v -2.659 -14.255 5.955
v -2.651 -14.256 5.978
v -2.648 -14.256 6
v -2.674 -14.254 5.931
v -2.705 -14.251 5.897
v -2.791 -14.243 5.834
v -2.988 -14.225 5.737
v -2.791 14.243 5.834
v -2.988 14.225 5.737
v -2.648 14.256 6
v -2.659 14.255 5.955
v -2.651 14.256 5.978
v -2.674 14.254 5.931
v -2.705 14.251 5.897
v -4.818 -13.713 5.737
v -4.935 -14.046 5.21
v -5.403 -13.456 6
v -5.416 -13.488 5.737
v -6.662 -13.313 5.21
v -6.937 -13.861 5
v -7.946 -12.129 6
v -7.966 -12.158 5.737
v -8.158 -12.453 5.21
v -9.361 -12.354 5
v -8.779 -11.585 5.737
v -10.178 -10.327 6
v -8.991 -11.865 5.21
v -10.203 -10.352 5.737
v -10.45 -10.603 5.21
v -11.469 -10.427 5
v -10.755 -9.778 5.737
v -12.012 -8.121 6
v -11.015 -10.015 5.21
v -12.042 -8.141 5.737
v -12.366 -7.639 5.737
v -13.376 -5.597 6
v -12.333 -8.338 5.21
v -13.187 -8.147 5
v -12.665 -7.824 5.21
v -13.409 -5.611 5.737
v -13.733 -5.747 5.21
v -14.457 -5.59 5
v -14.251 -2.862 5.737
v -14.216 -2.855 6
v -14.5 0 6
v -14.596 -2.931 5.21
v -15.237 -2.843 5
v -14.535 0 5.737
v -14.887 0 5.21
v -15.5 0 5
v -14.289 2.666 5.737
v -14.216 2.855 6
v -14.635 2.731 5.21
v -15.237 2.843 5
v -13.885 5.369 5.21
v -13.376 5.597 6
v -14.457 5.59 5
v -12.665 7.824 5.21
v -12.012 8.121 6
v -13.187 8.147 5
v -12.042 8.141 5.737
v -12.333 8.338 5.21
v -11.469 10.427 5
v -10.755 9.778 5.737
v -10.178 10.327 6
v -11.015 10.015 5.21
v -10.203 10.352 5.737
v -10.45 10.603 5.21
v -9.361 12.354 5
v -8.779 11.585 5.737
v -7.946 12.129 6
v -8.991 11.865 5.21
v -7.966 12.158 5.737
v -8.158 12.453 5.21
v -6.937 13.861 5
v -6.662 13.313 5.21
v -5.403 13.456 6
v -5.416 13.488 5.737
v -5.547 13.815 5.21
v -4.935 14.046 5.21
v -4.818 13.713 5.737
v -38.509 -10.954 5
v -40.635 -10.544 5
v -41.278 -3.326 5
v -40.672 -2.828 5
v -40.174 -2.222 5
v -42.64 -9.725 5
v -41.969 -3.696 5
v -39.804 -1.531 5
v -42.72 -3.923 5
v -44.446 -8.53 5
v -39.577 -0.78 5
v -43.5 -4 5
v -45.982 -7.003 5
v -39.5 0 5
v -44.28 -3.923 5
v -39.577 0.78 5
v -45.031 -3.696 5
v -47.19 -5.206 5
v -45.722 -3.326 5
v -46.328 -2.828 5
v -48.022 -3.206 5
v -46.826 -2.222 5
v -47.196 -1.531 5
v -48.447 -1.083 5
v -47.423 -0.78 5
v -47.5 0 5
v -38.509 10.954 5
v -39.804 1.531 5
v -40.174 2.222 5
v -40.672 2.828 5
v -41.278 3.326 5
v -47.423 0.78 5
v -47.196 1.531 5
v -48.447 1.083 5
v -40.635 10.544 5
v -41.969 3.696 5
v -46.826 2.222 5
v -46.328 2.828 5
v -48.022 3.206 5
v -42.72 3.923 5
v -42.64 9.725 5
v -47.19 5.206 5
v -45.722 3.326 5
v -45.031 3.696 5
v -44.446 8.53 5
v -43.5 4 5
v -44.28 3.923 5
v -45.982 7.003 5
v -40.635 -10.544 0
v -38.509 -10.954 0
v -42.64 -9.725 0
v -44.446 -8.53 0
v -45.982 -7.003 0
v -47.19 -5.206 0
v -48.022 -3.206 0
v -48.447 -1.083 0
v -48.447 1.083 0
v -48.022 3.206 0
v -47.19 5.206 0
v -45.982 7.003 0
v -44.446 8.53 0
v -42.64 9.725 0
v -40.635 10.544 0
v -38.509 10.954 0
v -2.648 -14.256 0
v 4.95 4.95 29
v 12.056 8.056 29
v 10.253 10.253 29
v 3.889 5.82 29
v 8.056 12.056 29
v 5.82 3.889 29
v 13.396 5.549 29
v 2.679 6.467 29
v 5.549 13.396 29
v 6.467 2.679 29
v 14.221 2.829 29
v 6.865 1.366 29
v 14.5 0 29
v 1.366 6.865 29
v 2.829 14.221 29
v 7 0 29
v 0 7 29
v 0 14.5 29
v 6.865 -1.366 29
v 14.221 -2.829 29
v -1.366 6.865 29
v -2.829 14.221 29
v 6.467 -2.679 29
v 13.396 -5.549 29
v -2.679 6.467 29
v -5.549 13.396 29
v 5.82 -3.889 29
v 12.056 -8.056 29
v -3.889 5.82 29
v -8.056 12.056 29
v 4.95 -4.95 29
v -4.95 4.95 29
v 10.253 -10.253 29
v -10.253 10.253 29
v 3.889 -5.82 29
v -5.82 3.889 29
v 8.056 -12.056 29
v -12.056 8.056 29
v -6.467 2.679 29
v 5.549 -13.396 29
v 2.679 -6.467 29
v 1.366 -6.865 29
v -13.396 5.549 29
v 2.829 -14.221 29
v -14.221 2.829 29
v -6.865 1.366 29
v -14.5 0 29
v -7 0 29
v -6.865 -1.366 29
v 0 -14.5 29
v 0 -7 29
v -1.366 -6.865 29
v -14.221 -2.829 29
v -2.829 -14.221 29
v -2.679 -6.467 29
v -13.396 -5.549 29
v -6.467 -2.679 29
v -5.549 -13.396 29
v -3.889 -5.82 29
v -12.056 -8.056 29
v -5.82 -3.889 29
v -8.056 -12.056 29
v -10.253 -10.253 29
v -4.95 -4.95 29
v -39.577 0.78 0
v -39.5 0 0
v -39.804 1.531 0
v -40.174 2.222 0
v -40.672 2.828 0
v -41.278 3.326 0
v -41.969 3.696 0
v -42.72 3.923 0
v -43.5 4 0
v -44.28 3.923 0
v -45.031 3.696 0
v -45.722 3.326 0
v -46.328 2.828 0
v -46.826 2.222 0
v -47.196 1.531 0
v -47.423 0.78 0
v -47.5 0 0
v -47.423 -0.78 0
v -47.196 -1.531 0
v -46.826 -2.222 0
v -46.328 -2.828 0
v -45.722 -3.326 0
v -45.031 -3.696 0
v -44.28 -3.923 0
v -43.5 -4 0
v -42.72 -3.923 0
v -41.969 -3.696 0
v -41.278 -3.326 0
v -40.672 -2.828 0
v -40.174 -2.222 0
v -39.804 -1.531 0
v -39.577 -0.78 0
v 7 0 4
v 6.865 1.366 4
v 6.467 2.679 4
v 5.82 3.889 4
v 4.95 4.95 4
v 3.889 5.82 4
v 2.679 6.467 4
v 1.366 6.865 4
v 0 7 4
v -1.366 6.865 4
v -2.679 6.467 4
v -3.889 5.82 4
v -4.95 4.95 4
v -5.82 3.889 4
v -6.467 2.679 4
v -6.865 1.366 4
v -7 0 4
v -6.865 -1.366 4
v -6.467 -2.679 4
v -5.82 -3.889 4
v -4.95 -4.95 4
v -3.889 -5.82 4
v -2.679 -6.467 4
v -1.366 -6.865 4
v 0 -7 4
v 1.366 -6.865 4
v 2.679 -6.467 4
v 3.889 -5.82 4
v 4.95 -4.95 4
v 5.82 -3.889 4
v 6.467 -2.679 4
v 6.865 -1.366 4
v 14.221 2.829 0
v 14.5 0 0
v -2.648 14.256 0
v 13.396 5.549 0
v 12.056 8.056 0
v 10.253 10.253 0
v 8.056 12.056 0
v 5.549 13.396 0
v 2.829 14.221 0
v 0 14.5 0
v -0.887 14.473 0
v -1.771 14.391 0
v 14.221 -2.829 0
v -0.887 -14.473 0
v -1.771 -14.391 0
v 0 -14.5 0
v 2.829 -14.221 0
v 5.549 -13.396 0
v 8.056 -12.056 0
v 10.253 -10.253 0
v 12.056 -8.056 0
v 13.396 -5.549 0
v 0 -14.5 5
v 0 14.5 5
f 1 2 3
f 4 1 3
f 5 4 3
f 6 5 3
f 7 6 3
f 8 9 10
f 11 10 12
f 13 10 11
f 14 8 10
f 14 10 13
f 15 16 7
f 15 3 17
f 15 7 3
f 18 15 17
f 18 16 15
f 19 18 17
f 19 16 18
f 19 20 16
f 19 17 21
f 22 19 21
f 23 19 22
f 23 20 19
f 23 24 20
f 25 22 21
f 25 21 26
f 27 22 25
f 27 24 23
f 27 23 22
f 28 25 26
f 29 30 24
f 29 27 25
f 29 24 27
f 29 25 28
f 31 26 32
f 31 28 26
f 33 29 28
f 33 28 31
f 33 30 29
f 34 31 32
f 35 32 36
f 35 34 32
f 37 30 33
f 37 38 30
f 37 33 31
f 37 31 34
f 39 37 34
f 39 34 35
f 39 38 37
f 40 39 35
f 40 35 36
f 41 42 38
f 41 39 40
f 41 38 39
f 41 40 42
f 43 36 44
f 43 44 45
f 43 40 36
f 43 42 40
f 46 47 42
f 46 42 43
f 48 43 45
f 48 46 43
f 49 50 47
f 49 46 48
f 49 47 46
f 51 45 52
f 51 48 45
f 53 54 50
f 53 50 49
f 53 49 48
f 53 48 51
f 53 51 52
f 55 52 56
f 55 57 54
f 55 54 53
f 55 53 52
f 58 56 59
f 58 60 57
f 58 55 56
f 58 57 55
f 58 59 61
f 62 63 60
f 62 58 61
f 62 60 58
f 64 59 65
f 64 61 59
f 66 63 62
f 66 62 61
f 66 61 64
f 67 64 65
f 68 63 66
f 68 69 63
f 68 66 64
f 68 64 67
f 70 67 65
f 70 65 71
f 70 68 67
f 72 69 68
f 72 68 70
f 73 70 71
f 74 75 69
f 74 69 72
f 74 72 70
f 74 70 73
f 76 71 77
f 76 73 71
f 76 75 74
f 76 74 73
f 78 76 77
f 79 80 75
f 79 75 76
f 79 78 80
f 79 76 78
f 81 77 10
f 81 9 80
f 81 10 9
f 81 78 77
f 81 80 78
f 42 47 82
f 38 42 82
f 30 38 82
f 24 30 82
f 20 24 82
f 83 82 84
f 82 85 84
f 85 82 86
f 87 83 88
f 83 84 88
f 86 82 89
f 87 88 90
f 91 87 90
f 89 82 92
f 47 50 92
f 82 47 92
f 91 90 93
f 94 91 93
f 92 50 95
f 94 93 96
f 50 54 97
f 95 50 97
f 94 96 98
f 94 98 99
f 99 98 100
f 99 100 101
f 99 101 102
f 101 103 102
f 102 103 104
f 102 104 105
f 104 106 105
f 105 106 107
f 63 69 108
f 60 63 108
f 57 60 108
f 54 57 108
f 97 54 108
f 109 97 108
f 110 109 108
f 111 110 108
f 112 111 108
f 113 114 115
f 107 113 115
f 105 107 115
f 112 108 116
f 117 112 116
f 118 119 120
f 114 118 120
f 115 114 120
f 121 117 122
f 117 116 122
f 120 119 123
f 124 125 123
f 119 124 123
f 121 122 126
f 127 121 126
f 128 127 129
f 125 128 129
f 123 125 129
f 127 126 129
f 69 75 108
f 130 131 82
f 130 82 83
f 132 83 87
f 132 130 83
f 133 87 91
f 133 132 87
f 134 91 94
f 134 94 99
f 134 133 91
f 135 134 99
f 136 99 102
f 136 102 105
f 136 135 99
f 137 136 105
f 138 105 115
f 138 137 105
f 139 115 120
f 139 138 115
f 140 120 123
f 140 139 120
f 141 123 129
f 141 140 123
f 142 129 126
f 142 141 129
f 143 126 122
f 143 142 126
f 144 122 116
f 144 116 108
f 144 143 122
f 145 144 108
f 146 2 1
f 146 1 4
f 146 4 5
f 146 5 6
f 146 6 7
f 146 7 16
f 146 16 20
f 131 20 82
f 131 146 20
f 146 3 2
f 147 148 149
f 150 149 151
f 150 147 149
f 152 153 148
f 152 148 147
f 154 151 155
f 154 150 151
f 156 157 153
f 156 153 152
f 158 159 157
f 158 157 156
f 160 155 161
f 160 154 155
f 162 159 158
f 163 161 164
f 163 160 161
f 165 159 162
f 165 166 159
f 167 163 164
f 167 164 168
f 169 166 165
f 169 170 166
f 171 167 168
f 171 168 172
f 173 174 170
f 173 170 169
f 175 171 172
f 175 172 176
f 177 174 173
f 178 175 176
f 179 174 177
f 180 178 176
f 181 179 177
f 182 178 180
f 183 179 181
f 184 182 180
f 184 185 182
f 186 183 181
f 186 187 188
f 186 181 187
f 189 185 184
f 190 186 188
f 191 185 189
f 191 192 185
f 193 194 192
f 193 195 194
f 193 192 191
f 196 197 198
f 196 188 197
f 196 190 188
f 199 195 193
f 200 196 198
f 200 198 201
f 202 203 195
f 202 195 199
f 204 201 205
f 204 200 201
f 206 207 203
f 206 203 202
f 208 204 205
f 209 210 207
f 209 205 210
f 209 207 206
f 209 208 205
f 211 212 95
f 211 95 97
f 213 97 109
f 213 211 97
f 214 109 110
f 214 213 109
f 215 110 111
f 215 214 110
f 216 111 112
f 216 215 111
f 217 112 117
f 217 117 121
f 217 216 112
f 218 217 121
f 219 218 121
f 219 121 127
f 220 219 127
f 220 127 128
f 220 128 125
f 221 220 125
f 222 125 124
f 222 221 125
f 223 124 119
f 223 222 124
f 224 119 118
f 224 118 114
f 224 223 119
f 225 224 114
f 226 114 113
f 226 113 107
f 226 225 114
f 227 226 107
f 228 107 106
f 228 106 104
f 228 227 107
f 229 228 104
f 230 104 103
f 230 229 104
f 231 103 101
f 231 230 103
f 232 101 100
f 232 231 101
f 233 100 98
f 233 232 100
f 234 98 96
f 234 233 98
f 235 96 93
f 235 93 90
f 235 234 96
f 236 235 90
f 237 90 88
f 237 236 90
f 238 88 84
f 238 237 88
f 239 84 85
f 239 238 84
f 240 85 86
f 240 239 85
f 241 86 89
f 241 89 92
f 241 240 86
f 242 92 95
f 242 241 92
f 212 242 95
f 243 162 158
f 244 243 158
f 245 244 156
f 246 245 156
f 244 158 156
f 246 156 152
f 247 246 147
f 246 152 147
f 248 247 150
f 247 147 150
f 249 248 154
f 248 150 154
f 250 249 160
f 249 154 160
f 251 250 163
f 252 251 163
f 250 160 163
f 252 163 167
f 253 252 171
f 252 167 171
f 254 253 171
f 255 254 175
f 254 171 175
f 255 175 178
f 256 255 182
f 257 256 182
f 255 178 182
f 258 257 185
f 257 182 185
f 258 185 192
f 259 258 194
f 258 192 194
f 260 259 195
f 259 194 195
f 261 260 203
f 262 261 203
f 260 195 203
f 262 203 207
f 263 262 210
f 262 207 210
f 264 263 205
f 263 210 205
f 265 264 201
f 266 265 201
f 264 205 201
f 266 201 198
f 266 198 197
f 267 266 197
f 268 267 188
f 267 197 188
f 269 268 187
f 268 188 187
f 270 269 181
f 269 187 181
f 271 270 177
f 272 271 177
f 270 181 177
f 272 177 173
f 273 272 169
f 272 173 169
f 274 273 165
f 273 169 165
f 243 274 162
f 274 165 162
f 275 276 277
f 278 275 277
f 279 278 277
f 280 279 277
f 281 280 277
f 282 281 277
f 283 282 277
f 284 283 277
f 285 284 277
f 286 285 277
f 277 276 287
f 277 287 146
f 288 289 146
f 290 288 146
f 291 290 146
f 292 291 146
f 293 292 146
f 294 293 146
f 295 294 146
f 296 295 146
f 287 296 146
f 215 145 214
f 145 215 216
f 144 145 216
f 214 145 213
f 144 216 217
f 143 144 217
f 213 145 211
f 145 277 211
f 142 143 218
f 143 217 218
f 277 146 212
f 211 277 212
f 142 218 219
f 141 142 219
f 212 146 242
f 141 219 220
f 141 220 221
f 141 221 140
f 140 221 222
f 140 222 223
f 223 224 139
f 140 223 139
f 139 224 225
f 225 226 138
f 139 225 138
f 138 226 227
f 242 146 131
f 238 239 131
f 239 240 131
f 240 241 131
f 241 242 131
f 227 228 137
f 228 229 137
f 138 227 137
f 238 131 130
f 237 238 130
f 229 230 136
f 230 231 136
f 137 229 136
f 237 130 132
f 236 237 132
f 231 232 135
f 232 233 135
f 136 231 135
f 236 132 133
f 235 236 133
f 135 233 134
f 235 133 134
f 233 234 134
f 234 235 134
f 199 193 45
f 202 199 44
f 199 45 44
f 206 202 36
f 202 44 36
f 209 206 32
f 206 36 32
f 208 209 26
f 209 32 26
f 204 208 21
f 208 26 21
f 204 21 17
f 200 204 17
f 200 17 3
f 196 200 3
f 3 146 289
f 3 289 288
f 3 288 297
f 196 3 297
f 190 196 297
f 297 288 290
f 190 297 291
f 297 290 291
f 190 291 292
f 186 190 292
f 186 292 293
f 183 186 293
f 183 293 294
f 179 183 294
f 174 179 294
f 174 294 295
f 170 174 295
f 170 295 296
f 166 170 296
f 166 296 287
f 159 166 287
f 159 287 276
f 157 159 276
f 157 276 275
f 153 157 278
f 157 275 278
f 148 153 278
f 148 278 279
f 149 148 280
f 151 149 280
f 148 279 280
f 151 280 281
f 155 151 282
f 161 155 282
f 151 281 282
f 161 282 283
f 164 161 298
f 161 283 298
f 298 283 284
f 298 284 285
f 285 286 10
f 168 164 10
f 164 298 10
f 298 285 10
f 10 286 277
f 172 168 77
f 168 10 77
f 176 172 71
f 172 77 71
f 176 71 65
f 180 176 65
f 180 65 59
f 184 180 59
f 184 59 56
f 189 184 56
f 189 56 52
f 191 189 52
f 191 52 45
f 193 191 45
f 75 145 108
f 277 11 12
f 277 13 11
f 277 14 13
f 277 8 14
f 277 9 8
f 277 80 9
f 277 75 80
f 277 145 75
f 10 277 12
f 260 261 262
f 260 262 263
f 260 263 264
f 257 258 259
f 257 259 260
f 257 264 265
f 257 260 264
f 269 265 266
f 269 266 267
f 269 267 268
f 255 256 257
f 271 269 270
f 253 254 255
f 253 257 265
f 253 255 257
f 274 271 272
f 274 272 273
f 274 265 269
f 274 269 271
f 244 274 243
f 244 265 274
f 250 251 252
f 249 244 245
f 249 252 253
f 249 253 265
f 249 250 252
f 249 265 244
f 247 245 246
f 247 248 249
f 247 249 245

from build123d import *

# Parameters (mm, degrees)
SKETCH2_R           = 14.5
BOSS_EXTRUDE1_DEPTH = 29
SKETCH5_R           = 4
BOSS_EXTRUDE2_DEPTH = 5
FILLET1_R           = 1
SKETCH8_R           = 7
CUT_EXTRUDE1_DEPTH  = 25


with BuildPart() as part:
    # Sketch2 → Boss-Extrude1 (new body)
    with BuildSketch(Plane.XY):
        with Locations(Location((0, 0, 0), (0, 0, 180))):
            Circle(SKETCH2_R)
    extrude(amount=BOSS_EXTRUDE1_DEPTH)

    # Sketch5 → Boss-Extrude2 (add)
    with BuildSketch(Plane.XY):
        with BuildLine():
            Line((0, 14.5), (0, -14.5))
            Line((0, -14.5), (-38.508744426, -10.953649377))
            ThreePointArc((-38.508744426, -10.953649377), (-48.5, 0), (-38.508744426, 10.953649377))
            Line((-38.508744426, 10.953649377), (0, 14.5))
        make_face()
        with Locations((-43.5, 0)):
            Circle(SKETCH5_R, mode=Mode.SUBTRACT)
    extrude(amount=BOSS_EXTRUDE2_DEPTH)

    # Fillet1
    fillet1_edges = [part.edges().sort_by_distance(p)[0] for p in [
        (-11.15009107, -9.269599189, 5),
    ]]
    fillet(fillet1_edges, radius=FILLET1_R)

    # Sketch8 → Cut-Extrude1 (cut)
    with BuildSketch(Plane.XY.offset(29)):
        Circle(SKETCH8_R)
    extrude(amount=-CUT_EXTRUDE1_DEPTH, mode=Mode.SUBTRACT)


solid = part.part
